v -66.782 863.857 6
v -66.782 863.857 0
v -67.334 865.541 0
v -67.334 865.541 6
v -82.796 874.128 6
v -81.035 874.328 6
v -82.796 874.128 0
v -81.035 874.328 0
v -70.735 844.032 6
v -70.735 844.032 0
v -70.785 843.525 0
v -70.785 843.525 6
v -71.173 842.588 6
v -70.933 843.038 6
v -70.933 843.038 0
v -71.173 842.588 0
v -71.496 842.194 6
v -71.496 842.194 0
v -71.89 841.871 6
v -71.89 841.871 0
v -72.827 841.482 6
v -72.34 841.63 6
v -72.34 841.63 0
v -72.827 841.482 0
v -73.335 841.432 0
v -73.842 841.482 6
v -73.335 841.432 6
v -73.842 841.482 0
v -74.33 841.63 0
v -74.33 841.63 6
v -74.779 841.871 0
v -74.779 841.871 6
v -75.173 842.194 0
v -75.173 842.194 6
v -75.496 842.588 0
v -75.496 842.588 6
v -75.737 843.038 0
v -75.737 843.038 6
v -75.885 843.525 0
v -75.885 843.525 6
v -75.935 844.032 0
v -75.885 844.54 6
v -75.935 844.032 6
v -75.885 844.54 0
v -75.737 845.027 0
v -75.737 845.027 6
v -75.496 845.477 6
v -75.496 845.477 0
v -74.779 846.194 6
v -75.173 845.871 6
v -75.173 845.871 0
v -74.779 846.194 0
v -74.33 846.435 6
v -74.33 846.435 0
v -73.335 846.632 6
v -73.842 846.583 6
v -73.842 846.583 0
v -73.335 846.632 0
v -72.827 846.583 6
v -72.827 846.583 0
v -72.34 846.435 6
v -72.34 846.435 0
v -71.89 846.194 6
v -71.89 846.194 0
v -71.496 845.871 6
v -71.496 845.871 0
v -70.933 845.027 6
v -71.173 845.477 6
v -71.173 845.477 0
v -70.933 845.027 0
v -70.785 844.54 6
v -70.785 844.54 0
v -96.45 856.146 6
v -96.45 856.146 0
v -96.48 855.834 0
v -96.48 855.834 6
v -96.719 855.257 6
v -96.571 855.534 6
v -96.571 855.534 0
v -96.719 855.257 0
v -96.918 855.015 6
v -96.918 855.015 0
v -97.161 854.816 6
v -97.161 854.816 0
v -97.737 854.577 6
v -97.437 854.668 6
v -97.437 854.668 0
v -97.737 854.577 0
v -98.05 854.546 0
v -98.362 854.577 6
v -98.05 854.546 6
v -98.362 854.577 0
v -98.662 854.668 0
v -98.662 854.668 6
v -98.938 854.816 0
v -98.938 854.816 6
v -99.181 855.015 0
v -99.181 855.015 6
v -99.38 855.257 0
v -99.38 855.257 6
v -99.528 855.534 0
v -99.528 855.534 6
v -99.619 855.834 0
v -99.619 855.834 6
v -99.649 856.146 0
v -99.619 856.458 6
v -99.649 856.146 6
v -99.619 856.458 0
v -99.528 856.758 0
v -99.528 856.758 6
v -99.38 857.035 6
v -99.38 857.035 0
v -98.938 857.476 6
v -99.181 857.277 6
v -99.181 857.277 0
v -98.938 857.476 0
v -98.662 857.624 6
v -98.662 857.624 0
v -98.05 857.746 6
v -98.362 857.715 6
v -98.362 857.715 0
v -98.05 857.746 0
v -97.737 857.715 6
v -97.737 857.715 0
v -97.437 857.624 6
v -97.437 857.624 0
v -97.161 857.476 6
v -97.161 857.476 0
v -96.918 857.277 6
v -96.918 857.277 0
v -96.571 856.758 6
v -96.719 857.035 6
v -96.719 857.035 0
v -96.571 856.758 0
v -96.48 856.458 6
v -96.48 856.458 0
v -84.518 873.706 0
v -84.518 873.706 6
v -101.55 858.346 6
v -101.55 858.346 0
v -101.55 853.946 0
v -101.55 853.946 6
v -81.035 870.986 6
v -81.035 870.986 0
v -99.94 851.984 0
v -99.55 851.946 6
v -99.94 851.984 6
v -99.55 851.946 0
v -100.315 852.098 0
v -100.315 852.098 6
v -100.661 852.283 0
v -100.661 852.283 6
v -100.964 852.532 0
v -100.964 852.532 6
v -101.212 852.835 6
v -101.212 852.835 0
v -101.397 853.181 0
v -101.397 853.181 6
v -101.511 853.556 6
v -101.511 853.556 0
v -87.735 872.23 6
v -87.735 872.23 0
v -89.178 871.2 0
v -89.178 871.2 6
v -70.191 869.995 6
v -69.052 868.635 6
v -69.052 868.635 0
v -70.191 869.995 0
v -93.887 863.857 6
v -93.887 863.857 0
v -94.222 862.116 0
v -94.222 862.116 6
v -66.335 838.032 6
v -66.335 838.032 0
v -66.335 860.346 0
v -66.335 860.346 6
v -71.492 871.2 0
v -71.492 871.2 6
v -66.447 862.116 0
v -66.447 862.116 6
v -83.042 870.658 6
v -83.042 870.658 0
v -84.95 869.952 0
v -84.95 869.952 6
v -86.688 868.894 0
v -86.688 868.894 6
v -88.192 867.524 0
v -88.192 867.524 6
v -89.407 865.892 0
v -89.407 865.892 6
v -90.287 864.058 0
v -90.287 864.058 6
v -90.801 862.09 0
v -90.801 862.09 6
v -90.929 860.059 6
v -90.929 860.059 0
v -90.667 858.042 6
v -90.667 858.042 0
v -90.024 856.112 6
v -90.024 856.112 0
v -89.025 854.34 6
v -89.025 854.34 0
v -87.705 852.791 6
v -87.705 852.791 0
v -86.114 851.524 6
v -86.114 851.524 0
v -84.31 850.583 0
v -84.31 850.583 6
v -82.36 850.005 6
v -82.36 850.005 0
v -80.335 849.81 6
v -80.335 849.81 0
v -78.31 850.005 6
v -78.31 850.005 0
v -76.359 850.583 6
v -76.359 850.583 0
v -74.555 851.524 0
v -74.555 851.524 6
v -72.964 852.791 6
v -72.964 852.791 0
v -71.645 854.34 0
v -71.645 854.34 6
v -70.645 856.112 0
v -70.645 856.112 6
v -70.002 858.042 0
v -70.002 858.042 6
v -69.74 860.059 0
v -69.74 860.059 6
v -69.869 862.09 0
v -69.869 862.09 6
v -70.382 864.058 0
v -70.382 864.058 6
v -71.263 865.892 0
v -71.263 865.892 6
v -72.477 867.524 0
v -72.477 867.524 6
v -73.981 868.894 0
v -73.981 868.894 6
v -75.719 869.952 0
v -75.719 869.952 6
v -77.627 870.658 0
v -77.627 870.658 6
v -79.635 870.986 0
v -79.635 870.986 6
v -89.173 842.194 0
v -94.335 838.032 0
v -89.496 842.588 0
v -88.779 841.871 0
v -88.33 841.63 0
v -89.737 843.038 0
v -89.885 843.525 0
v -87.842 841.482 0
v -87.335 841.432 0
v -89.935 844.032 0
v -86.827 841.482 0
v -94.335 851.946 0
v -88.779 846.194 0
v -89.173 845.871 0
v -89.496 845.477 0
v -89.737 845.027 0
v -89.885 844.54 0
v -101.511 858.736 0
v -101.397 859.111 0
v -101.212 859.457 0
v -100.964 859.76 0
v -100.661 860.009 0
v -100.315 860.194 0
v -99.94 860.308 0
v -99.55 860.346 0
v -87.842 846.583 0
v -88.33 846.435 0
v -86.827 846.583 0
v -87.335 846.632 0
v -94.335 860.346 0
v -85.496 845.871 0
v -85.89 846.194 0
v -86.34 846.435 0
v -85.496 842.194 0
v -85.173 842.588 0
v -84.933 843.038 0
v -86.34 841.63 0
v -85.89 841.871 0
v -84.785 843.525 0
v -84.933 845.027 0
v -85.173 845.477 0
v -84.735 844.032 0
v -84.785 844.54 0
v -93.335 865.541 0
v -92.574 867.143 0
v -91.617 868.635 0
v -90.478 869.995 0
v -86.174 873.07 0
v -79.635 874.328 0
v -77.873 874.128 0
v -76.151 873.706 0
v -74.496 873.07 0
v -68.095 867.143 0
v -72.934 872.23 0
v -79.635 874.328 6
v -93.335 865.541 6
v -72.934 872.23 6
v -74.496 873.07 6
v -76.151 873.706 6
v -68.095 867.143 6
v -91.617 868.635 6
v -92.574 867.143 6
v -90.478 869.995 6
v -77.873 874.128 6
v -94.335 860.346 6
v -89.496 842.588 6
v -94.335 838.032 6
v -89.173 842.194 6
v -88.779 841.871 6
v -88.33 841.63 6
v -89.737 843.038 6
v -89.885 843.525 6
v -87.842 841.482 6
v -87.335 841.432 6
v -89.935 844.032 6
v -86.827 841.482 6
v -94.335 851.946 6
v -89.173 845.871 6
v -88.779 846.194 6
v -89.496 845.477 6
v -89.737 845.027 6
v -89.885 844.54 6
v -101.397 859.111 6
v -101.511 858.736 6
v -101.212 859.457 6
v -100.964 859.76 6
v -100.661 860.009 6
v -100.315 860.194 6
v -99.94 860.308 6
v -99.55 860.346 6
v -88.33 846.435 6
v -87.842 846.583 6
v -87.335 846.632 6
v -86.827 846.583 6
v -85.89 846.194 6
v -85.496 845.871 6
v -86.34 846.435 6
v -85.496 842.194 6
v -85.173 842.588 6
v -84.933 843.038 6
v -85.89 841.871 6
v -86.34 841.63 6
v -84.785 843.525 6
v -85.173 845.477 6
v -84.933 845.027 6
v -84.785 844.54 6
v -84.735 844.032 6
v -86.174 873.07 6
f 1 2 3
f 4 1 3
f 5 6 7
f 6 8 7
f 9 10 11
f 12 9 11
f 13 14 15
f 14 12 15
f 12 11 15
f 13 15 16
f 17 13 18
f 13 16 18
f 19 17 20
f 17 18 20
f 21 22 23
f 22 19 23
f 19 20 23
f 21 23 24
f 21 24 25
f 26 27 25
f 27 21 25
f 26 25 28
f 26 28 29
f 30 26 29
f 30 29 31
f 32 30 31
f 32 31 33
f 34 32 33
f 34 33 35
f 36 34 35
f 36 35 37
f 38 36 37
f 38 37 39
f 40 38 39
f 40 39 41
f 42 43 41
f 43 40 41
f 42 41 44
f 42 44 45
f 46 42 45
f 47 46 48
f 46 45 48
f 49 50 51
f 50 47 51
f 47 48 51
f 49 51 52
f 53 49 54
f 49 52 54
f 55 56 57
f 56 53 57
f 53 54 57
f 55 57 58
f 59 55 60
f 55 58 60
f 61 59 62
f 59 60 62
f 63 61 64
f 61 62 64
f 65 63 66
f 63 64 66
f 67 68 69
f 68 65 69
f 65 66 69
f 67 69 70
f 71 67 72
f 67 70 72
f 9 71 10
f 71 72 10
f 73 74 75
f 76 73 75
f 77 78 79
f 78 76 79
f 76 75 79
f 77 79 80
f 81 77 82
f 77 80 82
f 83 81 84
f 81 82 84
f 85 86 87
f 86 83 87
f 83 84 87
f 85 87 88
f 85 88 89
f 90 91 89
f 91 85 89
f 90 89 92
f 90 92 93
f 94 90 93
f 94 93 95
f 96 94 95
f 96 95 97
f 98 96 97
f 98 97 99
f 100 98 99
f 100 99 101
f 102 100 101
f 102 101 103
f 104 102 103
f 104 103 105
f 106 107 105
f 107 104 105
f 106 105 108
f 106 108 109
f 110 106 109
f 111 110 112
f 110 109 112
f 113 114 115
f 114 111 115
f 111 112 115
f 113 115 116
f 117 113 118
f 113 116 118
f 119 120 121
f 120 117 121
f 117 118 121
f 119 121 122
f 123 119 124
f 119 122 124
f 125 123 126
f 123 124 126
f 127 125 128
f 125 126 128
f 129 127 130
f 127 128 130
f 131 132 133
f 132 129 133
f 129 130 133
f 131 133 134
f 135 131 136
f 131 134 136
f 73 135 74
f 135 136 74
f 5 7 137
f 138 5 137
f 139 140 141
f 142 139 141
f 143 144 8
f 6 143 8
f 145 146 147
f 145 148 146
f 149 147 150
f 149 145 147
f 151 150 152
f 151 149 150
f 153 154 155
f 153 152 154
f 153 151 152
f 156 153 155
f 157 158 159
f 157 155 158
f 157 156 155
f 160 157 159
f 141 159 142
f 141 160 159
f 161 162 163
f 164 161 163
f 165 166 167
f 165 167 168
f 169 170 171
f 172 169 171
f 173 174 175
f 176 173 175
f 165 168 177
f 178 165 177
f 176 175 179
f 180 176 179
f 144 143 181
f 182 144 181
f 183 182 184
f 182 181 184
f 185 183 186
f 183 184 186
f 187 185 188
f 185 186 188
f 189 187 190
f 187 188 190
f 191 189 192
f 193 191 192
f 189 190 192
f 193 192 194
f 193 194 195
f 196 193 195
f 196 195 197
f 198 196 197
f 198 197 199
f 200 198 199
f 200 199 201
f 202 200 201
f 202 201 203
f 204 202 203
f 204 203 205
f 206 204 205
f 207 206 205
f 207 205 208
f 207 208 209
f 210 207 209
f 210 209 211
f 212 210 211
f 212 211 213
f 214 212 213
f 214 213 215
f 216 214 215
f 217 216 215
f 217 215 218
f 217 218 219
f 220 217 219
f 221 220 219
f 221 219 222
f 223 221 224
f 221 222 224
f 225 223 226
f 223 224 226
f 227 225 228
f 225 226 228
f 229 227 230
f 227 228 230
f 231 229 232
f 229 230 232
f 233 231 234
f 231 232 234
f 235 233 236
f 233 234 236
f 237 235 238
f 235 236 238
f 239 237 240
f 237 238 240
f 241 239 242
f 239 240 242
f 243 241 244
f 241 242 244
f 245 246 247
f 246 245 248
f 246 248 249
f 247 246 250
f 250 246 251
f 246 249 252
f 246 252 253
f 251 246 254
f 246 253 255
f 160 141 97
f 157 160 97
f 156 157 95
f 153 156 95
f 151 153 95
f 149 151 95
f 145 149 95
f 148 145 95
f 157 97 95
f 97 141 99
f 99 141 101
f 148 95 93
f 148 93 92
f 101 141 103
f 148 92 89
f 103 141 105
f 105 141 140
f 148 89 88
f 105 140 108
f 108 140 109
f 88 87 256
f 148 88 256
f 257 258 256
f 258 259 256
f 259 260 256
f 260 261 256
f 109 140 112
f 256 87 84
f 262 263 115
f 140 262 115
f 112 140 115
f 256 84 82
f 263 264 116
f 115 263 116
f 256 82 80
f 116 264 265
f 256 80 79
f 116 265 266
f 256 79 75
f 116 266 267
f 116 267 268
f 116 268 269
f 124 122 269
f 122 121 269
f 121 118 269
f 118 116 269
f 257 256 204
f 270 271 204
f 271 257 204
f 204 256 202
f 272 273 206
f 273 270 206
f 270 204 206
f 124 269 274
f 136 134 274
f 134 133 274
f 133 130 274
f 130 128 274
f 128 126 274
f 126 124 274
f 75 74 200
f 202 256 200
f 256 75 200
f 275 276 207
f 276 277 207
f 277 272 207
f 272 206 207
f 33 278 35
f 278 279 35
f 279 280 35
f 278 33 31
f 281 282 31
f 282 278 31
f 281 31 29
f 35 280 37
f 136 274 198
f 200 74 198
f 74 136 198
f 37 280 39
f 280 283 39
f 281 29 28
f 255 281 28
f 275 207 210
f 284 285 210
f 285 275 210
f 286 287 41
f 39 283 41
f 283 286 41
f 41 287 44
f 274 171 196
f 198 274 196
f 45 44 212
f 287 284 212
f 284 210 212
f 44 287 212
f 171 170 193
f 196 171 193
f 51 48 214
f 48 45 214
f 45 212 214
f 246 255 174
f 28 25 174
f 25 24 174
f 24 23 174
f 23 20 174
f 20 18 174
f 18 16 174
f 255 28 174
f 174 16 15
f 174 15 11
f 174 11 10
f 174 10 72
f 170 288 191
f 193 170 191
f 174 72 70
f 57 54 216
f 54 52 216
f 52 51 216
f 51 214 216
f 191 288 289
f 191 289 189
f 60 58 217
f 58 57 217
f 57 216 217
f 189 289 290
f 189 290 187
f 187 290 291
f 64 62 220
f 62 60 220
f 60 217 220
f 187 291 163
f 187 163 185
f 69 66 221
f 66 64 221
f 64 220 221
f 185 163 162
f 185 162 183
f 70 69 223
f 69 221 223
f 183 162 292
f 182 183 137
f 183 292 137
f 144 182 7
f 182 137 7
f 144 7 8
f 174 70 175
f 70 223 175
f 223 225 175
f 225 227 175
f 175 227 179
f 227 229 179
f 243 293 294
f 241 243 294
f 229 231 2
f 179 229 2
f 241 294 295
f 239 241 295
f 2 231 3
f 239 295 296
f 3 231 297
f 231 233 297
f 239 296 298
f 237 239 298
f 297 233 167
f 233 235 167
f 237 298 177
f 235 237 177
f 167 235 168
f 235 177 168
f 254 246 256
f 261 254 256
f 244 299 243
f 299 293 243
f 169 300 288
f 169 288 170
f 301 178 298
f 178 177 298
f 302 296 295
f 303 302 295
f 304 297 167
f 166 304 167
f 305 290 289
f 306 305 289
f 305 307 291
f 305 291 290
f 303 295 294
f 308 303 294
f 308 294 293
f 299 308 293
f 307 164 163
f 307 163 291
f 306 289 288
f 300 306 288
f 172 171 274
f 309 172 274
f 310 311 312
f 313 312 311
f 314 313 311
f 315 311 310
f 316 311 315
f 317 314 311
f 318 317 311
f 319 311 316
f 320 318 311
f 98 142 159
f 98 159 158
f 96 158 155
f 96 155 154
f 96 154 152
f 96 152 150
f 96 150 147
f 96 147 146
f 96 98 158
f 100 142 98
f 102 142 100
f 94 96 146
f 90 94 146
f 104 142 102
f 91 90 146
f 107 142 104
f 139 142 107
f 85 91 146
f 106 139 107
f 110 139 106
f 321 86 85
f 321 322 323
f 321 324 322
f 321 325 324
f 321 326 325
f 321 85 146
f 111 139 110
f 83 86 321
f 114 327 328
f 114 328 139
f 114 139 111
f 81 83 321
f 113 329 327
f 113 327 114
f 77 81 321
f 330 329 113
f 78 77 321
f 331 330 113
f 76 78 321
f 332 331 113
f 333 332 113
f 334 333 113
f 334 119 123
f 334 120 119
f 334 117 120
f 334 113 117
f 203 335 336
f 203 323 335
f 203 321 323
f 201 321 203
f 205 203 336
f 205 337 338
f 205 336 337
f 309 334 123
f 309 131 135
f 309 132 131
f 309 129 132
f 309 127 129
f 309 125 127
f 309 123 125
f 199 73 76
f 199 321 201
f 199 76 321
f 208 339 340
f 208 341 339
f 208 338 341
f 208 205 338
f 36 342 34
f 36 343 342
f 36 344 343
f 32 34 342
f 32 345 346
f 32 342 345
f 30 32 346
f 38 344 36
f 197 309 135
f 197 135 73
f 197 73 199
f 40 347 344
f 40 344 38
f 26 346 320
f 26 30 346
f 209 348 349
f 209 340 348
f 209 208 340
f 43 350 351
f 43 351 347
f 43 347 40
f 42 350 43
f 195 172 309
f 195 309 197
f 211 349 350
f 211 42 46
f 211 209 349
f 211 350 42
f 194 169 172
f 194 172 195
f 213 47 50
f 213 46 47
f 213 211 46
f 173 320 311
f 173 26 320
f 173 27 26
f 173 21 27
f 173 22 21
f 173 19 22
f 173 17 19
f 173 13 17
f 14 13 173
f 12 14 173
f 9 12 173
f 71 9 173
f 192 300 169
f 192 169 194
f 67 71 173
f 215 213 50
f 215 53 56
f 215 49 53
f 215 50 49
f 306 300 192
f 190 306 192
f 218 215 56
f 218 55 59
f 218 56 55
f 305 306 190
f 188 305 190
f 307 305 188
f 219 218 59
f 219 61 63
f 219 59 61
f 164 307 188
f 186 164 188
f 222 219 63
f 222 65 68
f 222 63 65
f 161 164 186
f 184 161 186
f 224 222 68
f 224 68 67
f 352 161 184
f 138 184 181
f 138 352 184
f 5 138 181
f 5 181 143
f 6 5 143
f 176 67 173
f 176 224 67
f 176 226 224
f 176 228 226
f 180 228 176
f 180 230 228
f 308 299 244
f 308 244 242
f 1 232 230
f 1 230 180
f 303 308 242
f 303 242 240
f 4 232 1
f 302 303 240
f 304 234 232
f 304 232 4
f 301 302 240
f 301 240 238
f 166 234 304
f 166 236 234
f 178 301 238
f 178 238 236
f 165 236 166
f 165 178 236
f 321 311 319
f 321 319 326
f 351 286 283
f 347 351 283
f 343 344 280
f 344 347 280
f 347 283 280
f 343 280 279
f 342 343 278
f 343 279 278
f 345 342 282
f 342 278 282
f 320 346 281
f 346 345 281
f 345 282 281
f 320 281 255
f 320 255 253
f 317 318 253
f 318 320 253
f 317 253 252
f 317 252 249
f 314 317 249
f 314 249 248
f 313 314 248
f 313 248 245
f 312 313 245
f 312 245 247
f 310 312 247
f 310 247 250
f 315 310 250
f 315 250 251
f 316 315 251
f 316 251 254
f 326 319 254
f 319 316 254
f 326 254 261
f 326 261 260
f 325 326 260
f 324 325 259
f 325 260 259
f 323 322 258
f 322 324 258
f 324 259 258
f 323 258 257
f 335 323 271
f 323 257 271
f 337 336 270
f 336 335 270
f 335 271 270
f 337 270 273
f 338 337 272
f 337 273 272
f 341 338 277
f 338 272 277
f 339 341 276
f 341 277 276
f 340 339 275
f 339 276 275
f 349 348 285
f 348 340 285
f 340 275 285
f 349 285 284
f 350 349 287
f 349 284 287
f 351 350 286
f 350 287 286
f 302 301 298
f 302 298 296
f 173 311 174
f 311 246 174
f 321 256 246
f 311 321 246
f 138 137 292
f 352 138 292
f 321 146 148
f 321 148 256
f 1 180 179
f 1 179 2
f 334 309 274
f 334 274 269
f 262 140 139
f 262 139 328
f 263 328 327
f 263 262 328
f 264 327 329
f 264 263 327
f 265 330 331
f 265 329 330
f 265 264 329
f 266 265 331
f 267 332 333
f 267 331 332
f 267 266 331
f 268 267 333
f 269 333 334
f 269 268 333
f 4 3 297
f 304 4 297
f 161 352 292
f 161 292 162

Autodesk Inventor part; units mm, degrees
ref_plane "YZ Plane" through (0, 0, 0) normal (1, 0, 0) x (0, 1, 0)
ref_plane "XZ Plane" through (0, 0, 0) normal (0, 1, 0) x (-1, 0, 0)
ref_plane "XY Plane" through (0, 0, 0) normal (0, 0, 1) x (1, 0, 0)
sketch "Sketch1" plane through (0, 0, 0) normal (0, 0, 1) x (1, 0, 0)
  line L0 (-94.3346, 851.946) -> (-94.3346, 838.0325)
  line L1 (-94.3346, 838.0325) -> (-66.3346, 838.0325)
  line L2 (-66.3346, 838.0325) -> (-66.3346, 860.346)
  line L3 (-66.3346, 860.346) -> (-66.4468, 862.1155)
  line L4 (-66.4468, 862.1155) -> (-66.7819, 863.8566)
  line L5 (-66.7819, 863.8566) -> (-67.3343, 865.5414)
  line L6 (-67.3343, 865.5414) -> (-68.0952, 867.1429)
  line L7 (-68.0952, 867.1429) -> (-69.0524, 868.6354)
  line L8 (-69.0524, 868.6354) -> (-70.1906, 869.9949)
  line L9 (-70.1906, 869.9949) -> (-71.4915, 871.1996)
  line L10 (-71.4915, 871.1996) -> (-72.9342, 872.2303)
  line L11 (-72.9342, 872.2303) -> (-74.4956, 873.0703)
  line L12 (-74.4956, 873.0703) -> (-76.1507, 873.7063)
  line L13 (-76.1507, 873.7063) -> (-77.8729, 874.1279)
  line L14 (-77.8729, 874.1279) -> (-79.6346, 874.3285)
  line L15 (-79.6346, 874.3285) -> (-79.6346, 870.8227)
  line L16 (-79.6346, 870.8227) -> (-77.9981, 870.5828)
  line L17 (-77.9981, 870.5828) -> (-76.4195, 870.0889)
  line L18 (-76.4195, 870.0889) -> (-74.9382, 869.3532)
  line L19 (-74.9382, 869.3532) -> (-73.5907, 868.394)
  line L20 (-73.5907, 868.394) -> (-72.4106, 867.2352)
  line L21 (-72.4106, 867.2352) -> (-71.427, 865.9054)
  line L22 (-71.427, 865.9054) -> (-70.6646, 864.4376)
  line L23 (-70.6646, 864.4376) -> (-70.142, 862.8683)
  line L24 (-70.142, 862.8683) -> (-69.8724, 861.2365)
  line L25 (-69.8724, 861.2365) -> (-69.8623, 859.5825)
  line L26 (-69.8623, 859.5825) -> (-70.1122, 857.9475)
  line L27 (-70.1122, 857.9475) -> (-70.6156, 856.372)
  line L28 (-70.6156, 856.372) -> (-71.3603, 854.8951)
  line L29 (-71.3603, 854.8951) -> (-72.3276, 853.5535)
  line L30 (-72.3276, 853.5535) -> (-73.4936, 852.3804)
  line L31 (-73.4936, 852.3804) -> (-74.8293, 851.405)
  line L32 (-74.8293, 851.405) -> (-76.3017, 850.6514)
  line L33 (-76.3017, 850.6514) -> (-77.8741, 850.1384)
  line L34 (-77.8741, 850.1384) -> (-79.5076, 849.8787)
  line L35 (-79.5076, 849.8787) -> (-81.1615, 849.8787)
  line L36 (-81.1615, 849.8787) -> (-82.795, 850.1384)
  line L37 (-82.795, 850.1384) -> (-84.3674, 850.6514)
  line L38 (-84.3674, 850.6514) -> (-85.8398, 851.405)
  line L39 (-85.8398, 851.405) -> (-87.1755, 852.3804)
  line L40 (-87.1755, 852.3804) -> (-88.3415, 853.5535)
  line L41 (-88.3415, 853.5535) -> (-89.3088, 854.8951)
  line L42 (-89.3088, 854.8951) -> (-90.0535, 856.372)
  line L43 (-90.0535, 856.372) -> (-90.5569, 857.9475)
  line L44 (-90.5569, 857.9475) -> (-90.8068, 859.5825)
  line L45 (-90.8068, 859.5825) -> (-90.7967, 861.2365)
  line L46 (-90.7967, 861.2365) -> (-90.5271, 862.8683)
  line L47 (-90.5271, 862.8683) -> (-90.0046, 864.4376)
  line L48 (-90.0046, 864.4376) -> (-89.2421, 865.9054)
  line L49 (-89.2421, 865.9054) -> (-88.2586, 867.2352)
  line L50 (-88.2586, 867.2352) -> (-87.0784, 868.394)
  line L51 (-87.0784, 868.394) -> (-85.731, 869.3532)
  line L52 (-85.731, 869.3532) -> (-84.2496, 870.0889)
  line L53 (-84.2496, 870.0889) -> (-82.6711, 870.5828)
  line L54 (-82.6711, 870.5828) -> (-81.0346, 870.8227)
  line L55 (-81.0346, 870.8227) -> (-81.0346, 874.3285)
  line L56 (-81.0346, 874.3285) -> (-82.7962, 874.1279)
  line L57 (-82.7962, 874.1279) -> (-84.5184, 873.7063)
  line L58 (-84.5184, 873.7063) -> (-86.1735, 873.0703)
  line L59 (-86.1735, 873.0703) -> (-87.7349, 872.2303)
  line L60 (-87.7349, 872.2303) -> (-89.1776, 871.1996)
  line L61 (-89.1776, 871.1996) -> (-90.4785, 869.9949)
  line L62 (-90.4785, 869.9949) -> (-91.6167, 868.6354)
  line L63 (-91.6167, 868.6354) -> (-92.5739, 867.1429)
  line L64 (-92.5739, 867.1429) -> (-93.3349, 865.5414)
  line L65 (-93.3349, 865.5414) -> (-93.8873, 863.8566)
  line L66 (-93.8873, 863.8566) -> (-94.2223, 862.1155)
  line L67 (-94.2223, 862.1155) -> (-94.3346, 860.346)
  line L68 (-94.3346, 860.346) -> (-99.5495, 860.346)
  arc A0 (-99.5495, 860.346) -> (-101.5495, 858.346) centre (-99.5495, 858.346) ccw
  line L69 (-101.5495, 858.346) -> (-101.5495, 853.946)
  arc A1 (-101.5495, 853.946) -> (-99.5495, 851.946) centre (-99.5495, 853.946) ccw
  line L70 (-99.5495, 851.946) -> (-94.3346, 851.946)
  circle A2 centre (-98.0495, 856.146) radius 1.6
  circle A3 centre (-87.3346, 844.0325) radius 2.6
  circle A4 centre (-73.3346, 844.0325) radius 2.6
  point P0 (0, 0)
extrude "Extrusion1" add sketch "Sketch1" along normal blind 6
sketch "Sketch3" plane through (0, 0, 0) normal (0, 0, -1) x (-1, 0, 0)
  line L0 (69.8724, 861.2365) -> (69.8623, 859.5825) projected
  line L1 (69.8674, 860.4095) -> (90.8017, 860.4095)
  line L2 (90.8068, 859.5825) -> (90.7967, 861.2365) projected
  point P0 (0, 0)
  point P1 (80.3346, 860.4095)
hole "Hole1" at (-80.3346, 860.4095, 0) direction (0, 0, 1) diameter 21.2 depth 8 tip angle 118
properties part number "Left Bed Holder Upper"
